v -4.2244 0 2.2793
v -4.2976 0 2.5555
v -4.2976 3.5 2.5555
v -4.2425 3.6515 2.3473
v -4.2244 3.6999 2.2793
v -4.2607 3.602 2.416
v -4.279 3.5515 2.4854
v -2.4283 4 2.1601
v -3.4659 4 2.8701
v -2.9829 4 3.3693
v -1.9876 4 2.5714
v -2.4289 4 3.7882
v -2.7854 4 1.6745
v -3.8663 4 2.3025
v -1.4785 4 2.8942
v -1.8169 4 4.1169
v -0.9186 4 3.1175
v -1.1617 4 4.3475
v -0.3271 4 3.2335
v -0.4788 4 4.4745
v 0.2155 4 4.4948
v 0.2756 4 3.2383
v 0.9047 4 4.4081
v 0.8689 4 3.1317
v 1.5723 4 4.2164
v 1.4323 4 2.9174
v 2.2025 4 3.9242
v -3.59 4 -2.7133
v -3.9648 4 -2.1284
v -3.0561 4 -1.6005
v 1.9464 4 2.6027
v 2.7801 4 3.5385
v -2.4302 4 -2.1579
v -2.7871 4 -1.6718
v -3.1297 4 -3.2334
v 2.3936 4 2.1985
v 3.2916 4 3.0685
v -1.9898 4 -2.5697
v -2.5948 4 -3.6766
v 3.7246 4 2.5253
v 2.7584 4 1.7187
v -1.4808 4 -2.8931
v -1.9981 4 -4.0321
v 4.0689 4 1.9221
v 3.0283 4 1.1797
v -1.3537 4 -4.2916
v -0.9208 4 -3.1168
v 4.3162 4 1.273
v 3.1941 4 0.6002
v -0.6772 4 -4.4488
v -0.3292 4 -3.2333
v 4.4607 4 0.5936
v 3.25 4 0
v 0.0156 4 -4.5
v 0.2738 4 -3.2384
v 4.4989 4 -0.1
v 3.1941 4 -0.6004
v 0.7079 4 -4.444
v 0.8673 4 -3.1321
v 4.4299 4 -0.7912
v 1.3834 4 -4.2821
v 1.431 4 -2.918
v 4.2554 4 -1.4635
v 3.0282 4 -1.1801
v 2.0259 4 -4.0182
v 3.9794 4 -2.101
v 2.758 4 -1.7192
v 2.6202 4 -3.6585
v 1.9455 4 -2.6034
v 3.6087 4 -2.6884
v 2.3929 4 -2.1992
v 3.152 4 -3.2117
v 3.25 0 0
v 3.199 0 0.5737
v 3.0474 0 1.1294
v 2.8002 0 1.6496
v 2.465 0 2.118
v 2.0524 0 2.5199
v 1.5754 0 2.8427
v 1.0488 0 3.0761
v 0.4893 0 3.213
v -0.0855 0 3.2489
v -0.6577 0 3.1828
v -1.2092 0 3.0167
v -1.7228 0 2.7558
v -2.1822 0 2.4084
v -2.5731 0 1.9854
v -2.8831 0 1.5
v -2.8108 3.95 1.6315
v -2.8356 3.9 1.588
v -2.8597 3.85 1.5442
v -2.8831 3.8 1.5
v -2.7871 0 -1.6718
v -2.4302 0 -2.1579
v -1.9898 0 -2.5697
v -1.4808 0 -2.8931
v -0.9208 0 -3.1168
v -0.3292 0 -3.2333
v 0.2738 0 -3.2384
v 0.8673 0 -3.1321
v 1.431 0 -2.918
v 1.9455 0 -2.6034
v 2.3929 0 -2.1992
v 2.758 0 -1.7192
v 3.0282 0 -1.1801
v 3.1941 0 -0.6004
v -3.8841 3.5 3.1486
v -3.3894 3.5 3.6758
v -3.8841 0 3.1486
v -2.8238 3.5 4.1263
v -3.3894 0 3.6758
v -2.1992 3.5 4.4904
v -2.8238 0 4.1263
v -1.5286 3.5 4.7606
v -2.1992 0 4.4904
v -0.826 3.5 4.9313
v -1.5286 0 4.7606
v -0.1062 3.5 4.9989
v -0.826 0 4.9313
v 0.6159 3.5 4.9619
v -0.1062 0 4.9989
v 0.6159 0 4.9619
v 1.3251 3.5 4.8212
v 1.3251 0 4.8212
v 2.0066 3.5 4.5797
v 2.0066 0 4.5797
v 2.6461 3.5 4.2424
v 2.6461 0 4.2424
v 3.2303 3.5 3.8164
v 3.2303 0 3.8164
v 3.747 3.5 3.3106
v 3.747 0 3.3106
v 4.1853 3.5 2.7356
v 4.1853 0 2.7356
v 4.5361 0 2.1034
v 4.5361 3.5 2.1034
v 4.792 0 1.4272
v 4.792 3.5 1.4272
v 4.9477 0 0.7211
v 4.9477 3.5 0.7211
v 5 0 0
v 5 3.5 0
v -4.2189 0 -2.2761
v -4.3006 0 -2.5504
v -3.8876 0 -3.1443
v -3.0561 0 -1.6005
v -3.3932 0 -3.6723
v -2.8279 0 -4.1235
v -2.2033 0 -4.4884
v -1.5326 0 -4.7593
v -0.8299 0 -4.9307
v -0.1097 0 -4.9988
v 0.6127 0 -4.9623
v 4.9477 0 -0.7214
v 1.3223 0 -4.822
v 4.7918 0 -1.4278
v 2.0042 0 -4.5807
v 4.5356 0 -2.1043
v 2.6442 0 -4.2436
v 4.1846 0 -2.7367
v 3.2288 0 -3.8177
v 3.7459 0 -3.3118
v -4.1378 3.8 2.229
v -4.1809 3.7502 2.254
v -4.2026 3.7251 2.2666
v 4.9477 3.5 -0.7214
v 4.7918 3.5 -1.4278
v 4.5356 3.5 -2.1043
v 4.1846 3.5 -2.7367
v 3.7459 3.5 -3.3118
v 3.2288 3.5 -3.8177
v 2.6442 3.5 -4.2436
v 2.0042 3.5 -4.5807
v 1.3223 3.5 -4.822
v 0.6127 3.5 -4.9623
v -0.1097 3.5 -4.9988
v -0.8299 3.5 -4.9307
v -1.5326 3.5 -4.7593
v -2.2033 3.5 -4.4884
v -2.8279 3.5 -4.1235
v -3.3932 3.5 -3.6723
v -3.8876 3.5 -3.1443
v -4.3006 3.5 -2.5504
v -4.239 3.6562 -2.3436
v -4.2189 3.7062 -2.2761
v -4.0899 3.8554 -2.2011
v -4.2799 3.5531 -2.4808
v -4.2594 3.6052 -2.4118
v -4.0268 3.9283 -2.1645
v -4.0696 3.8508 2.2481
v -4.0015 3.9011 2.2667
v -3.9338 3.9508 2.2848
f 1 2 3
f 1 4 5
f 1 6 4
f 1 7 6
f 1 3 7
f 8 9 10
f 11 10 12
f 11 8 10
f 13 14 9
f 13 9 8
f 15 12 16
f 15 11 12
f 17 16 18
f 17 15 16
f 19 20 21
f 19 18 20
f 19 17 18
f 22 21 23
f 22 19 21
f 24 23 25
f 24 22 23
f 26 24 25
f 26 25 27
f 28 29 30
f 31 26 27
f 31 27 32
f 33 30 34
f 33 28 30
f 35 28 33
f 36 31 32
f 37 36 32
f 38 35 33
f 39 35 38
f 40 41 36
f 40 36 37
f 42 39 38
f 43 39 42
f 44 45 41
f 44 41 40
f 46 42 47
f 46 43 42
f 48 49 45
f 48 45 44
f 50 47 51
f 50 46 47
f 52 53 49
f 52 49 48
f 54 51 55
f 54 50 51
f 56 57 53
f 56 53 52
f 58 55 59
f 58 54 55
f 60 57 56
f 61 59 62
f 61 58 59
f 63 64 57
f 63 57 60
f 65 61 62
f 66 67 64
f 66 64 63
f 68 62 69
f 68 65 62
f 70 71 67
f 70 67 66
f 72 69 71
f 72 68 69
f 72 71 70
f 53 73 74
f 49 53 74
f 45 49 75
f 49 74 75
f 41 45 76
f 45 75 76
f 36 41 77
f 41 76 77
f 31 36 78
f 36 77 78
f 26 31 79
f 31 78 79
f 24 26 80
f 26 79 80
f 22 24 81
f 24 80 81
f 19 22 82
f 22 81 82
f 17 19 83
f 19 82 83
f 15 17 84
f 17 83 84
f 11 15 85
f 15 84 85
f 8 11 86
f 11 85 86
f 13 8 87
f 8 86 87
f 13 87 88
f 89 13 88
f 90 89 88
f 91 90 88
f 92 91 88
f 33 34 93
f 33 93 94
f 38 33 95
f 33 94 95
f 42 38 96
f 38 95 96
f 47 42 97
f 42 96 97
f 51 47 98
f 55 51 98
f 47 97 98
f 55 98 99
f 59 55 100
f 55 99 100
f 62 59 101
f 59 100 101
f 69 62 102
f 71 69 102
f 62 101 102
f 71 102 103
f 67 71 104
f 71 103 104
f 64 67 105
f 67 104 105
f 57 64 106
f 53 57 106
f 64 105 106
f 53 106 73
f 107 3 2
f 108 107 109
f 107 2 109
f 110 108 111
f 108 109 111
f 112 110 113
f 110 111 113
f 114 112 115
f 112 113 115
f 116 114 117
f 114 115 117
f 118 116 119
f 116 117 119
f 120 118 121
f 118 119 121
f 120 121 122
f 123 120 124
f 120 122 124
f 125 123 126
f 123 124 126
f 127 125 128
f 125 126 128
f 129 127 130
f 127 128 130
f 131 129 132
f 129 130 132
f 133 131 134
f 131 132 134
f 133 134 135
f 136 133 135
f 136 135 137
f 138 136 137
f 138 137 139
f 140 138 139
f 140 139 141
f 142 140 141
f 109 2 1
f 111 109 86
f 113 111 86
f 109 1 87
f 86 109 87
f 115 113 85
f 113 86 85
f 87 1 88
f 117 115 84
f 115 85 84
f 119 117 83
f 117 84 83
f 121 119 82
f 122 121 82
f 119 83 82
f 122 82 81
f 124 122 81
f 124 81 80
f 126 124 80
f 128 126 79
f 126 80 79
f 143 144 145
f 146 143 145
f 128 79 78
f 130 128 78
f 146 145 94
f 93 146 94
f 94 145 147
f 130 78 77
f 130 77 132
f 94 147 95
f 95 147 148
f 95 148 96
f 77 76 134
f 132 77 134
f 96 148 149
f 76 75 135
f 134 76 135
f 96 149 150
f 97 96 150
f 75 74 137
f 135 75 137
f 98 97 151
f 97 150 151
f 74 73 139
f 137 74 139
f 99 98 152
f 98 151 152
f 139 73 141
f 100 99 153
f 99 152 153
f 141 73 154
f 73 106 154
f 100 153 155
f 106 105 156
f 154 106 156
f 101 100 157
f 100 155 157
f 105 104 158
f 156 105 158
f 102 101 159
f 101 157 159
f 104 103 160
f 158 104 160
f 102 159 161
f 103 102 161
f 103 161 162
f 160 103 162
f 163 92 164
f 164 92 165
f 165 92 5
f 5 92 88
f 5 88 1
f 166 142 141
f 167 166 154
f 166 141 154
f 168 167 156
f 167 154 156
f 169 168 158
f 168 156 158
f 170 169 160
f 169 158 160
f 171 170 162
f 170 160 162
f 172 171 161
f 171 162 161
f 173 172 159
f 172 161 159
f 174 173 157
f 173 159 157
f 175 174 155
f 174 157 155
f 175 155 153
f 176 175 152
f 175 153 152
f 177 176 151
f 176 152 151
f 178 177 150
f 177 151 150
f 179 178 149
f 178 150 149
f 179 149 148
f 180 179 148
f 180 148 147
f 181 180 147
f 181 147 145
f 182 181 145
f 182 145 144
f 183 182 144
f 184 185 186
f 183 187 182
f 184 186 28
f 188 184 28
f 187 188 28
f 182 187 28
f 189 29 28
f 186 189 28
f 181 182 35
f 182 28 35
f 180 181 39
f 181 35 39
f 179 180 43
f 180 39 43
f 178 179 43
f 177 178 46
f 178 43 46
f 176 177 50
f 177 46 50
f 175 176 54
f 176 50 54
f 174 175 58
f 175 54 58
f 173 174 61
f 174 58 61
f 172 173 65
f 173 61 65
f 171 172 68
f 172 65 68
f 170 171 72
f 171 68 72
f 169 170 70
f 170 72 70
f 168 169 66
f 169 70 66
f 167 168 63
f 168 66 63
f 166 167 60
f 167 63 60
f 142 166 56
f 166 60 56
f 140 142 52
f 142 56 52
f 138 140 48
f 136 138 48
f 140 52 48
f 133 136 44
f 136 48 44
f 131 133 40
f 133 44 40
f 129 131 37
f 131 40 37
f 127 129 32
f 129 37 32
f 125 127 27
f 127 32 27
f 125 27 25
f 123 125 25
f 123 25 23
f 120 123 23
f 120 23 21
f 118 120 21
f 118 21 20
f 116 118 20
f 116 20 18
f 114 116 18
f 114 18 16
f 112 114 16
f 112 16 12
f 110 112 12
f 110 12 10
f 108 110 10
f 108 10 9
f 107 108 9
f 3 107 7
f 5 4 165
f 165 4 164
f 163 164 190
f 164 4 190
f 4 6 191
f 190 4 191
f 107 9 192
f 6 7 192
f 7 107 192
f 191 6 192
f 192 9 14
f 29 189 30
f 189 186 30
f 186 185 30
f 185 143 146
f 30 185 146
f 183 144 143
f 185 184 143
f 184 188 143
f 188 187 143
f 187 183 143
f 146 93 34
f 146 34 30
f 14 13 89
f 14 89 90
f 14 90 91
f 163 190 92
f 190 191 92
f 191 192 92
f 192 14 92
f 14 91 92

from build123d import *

# Parameters (mm, degrees)
BOSS_EXTRUDE1_DEPTH = 4
CHAMFER1_SIZE       = 0.2
CHAMFER1_SIZE_2     = 0.206341937
CHAMFER2_SIZE       = 0.5


with BuildPart() as part:
    # Sketch1 → Boss-Extrude1 (new body)
    with BuildSketch(Plane(origin=(0, 0, 0), x_dir=(1, 0, 0), z_dir=(0, 1, 0))):
        with BuildLine():
            ThreePointArc((5, 0), (1.227434059, 4.846999652), (-4.397362252, 2.379748983))
            Line((-4.397362252, 2.379748983), (-2.883140649, 1.5))
            ThreePointArc((-2.883140649, 1.5), (0.772105204, 3.156953207), (3.25, 0))
            ThreePointArc((3.25, 0), (0.772105204, -3.156953207), (-2.883140649, -1.5))
            Line((-2.883140649, -1.5), (-4.397362252, -2.379748983))
            ThreePointArc((-4.397362252, -2.379748983), (1.227434059, -4.846999652), (5, 0))
        make_face()
    extrude(amount=BOSS_EXTRUDE1_DEPTH)

    # Chamfer1
    # the kernel refuses this chamfer: 0.206341937, 0.2, 0.191297121 mm, written as the material it takes off along each edge
    with BuildSketch(Plane(origin=(-2.883140649, -0.514336598, -1.5), x_dir=(0.4881882615859918, 0, -0.8727383463843256), z_dir=(0, 1, 0))) as chamfer1_piece_1:
        with BuildLine():
            Line((0.196815803, 0), (CHAMFER1_SIZE * 0.0163116056584, CHAMFER1_SIZE * 0.99986695691))
            Line((CHAMFER1_SIZE * 0.0163116056584, CHAMFER1_SIZE * 0.99986695691), (0, 0))
            ThreePointArc((0, 0), (0.101193556, 0.001489012), (0.196815803, 0))
        make_face()
    extrude(amount=5.028673195, mode=Mode.SUBTRACT)
    with BuildSketch(Plane(origin=(-4.397362252, -0.531068819, -2.379748983), x_dir=(0.4931124519861111, 0, -0.8699655796042999), z_dir=(0, 1, 0))) as chamfer1_piece_2:
        with BuildLine():
            Line((0.196188757, 0), (-CHAMFER1_SIZE_2 * 0.010660935079, -CHAMFER1_SIZE_2 * 0.999943172174))
            Line((-CHAMFER1_SIZE_2 * 0.010660935079, -CHAMFER1_SIZE_2 * 0.999943172174), (0, 0))
            ThreePointArc((0, 0), (0.100953531, 0.000961526), (0.196188757, 0))
        make_face()
    extrude(amount=5.062137639, mode=Mode.SUBTRACT)
    with BuildSketch(Plane(origin=(-4.397362252, -0.520052168, 2.379748983), x_dir=(0.49362201920020077, 0, 0.8696765503109283), z_dir=(0, 1, 0))) as chamfer1_piece_3:
        with BuildLine():
            Line((0.202045895, 0), (-CHAMFER1_SIZE * 0.0100751366451, CHAMFER1_SIZE * 0.999949244523))
            Line((-CHAMFER1_SIZE * 0.0100751366451, CHAMFER1_SIZE * 0.999949244523), (0, 0))
            ThreePointArc((0, 0), (0.103969214, -0.0010198), (0.202045895, 0))
        make_face()
    extrude(amount=5.040104337, mode=Mode.SUBTRACT)
    # the kernel refuses this chamfer: 0.206341937, 0.2, 0.191297121 mm, written as the material it takes off along each edge
    with BuildSketch(Plane(origin=(-2.438414829, 4, 1.241618342), x_dir=(0.502359075260422, 0, 0.8646591001680913), z_dir=(-0.8646591001680914, 0, 0.502359075260422))) as chamfer1_2_piece_1:
        Polygon((CHAMFER1_SIZE, 0), (0, -CHAMFER1_SIZE), (0, 0), align=None)
    extrude(amount=2.57990857, mode=Mode.SUBTRACT)

    # Chamfer2
    # the kernel refuses this chamfer: 0.5 mm, written as the material it takes off along each edge
    with BuildSketch(Plane(origin=(0, 4, 0), x_dir=(-0.9618869269385497, 0, -0.2734475082803154), z_dir=(-0.2734475082803154, 0, 0.9618869269385497))) as chamfer2_piece_1:
        Polygon((5, CHAMFER2_SIZE), (5 - CHAMFER2_SIZE, 0), (5, 0), align=None)
    revolve(axis=Axis((0, 4, 0), (0, -1, 0)), revolution_arc=328.193834559, mode=Mode.SUBTRACT)


solid = part.part
